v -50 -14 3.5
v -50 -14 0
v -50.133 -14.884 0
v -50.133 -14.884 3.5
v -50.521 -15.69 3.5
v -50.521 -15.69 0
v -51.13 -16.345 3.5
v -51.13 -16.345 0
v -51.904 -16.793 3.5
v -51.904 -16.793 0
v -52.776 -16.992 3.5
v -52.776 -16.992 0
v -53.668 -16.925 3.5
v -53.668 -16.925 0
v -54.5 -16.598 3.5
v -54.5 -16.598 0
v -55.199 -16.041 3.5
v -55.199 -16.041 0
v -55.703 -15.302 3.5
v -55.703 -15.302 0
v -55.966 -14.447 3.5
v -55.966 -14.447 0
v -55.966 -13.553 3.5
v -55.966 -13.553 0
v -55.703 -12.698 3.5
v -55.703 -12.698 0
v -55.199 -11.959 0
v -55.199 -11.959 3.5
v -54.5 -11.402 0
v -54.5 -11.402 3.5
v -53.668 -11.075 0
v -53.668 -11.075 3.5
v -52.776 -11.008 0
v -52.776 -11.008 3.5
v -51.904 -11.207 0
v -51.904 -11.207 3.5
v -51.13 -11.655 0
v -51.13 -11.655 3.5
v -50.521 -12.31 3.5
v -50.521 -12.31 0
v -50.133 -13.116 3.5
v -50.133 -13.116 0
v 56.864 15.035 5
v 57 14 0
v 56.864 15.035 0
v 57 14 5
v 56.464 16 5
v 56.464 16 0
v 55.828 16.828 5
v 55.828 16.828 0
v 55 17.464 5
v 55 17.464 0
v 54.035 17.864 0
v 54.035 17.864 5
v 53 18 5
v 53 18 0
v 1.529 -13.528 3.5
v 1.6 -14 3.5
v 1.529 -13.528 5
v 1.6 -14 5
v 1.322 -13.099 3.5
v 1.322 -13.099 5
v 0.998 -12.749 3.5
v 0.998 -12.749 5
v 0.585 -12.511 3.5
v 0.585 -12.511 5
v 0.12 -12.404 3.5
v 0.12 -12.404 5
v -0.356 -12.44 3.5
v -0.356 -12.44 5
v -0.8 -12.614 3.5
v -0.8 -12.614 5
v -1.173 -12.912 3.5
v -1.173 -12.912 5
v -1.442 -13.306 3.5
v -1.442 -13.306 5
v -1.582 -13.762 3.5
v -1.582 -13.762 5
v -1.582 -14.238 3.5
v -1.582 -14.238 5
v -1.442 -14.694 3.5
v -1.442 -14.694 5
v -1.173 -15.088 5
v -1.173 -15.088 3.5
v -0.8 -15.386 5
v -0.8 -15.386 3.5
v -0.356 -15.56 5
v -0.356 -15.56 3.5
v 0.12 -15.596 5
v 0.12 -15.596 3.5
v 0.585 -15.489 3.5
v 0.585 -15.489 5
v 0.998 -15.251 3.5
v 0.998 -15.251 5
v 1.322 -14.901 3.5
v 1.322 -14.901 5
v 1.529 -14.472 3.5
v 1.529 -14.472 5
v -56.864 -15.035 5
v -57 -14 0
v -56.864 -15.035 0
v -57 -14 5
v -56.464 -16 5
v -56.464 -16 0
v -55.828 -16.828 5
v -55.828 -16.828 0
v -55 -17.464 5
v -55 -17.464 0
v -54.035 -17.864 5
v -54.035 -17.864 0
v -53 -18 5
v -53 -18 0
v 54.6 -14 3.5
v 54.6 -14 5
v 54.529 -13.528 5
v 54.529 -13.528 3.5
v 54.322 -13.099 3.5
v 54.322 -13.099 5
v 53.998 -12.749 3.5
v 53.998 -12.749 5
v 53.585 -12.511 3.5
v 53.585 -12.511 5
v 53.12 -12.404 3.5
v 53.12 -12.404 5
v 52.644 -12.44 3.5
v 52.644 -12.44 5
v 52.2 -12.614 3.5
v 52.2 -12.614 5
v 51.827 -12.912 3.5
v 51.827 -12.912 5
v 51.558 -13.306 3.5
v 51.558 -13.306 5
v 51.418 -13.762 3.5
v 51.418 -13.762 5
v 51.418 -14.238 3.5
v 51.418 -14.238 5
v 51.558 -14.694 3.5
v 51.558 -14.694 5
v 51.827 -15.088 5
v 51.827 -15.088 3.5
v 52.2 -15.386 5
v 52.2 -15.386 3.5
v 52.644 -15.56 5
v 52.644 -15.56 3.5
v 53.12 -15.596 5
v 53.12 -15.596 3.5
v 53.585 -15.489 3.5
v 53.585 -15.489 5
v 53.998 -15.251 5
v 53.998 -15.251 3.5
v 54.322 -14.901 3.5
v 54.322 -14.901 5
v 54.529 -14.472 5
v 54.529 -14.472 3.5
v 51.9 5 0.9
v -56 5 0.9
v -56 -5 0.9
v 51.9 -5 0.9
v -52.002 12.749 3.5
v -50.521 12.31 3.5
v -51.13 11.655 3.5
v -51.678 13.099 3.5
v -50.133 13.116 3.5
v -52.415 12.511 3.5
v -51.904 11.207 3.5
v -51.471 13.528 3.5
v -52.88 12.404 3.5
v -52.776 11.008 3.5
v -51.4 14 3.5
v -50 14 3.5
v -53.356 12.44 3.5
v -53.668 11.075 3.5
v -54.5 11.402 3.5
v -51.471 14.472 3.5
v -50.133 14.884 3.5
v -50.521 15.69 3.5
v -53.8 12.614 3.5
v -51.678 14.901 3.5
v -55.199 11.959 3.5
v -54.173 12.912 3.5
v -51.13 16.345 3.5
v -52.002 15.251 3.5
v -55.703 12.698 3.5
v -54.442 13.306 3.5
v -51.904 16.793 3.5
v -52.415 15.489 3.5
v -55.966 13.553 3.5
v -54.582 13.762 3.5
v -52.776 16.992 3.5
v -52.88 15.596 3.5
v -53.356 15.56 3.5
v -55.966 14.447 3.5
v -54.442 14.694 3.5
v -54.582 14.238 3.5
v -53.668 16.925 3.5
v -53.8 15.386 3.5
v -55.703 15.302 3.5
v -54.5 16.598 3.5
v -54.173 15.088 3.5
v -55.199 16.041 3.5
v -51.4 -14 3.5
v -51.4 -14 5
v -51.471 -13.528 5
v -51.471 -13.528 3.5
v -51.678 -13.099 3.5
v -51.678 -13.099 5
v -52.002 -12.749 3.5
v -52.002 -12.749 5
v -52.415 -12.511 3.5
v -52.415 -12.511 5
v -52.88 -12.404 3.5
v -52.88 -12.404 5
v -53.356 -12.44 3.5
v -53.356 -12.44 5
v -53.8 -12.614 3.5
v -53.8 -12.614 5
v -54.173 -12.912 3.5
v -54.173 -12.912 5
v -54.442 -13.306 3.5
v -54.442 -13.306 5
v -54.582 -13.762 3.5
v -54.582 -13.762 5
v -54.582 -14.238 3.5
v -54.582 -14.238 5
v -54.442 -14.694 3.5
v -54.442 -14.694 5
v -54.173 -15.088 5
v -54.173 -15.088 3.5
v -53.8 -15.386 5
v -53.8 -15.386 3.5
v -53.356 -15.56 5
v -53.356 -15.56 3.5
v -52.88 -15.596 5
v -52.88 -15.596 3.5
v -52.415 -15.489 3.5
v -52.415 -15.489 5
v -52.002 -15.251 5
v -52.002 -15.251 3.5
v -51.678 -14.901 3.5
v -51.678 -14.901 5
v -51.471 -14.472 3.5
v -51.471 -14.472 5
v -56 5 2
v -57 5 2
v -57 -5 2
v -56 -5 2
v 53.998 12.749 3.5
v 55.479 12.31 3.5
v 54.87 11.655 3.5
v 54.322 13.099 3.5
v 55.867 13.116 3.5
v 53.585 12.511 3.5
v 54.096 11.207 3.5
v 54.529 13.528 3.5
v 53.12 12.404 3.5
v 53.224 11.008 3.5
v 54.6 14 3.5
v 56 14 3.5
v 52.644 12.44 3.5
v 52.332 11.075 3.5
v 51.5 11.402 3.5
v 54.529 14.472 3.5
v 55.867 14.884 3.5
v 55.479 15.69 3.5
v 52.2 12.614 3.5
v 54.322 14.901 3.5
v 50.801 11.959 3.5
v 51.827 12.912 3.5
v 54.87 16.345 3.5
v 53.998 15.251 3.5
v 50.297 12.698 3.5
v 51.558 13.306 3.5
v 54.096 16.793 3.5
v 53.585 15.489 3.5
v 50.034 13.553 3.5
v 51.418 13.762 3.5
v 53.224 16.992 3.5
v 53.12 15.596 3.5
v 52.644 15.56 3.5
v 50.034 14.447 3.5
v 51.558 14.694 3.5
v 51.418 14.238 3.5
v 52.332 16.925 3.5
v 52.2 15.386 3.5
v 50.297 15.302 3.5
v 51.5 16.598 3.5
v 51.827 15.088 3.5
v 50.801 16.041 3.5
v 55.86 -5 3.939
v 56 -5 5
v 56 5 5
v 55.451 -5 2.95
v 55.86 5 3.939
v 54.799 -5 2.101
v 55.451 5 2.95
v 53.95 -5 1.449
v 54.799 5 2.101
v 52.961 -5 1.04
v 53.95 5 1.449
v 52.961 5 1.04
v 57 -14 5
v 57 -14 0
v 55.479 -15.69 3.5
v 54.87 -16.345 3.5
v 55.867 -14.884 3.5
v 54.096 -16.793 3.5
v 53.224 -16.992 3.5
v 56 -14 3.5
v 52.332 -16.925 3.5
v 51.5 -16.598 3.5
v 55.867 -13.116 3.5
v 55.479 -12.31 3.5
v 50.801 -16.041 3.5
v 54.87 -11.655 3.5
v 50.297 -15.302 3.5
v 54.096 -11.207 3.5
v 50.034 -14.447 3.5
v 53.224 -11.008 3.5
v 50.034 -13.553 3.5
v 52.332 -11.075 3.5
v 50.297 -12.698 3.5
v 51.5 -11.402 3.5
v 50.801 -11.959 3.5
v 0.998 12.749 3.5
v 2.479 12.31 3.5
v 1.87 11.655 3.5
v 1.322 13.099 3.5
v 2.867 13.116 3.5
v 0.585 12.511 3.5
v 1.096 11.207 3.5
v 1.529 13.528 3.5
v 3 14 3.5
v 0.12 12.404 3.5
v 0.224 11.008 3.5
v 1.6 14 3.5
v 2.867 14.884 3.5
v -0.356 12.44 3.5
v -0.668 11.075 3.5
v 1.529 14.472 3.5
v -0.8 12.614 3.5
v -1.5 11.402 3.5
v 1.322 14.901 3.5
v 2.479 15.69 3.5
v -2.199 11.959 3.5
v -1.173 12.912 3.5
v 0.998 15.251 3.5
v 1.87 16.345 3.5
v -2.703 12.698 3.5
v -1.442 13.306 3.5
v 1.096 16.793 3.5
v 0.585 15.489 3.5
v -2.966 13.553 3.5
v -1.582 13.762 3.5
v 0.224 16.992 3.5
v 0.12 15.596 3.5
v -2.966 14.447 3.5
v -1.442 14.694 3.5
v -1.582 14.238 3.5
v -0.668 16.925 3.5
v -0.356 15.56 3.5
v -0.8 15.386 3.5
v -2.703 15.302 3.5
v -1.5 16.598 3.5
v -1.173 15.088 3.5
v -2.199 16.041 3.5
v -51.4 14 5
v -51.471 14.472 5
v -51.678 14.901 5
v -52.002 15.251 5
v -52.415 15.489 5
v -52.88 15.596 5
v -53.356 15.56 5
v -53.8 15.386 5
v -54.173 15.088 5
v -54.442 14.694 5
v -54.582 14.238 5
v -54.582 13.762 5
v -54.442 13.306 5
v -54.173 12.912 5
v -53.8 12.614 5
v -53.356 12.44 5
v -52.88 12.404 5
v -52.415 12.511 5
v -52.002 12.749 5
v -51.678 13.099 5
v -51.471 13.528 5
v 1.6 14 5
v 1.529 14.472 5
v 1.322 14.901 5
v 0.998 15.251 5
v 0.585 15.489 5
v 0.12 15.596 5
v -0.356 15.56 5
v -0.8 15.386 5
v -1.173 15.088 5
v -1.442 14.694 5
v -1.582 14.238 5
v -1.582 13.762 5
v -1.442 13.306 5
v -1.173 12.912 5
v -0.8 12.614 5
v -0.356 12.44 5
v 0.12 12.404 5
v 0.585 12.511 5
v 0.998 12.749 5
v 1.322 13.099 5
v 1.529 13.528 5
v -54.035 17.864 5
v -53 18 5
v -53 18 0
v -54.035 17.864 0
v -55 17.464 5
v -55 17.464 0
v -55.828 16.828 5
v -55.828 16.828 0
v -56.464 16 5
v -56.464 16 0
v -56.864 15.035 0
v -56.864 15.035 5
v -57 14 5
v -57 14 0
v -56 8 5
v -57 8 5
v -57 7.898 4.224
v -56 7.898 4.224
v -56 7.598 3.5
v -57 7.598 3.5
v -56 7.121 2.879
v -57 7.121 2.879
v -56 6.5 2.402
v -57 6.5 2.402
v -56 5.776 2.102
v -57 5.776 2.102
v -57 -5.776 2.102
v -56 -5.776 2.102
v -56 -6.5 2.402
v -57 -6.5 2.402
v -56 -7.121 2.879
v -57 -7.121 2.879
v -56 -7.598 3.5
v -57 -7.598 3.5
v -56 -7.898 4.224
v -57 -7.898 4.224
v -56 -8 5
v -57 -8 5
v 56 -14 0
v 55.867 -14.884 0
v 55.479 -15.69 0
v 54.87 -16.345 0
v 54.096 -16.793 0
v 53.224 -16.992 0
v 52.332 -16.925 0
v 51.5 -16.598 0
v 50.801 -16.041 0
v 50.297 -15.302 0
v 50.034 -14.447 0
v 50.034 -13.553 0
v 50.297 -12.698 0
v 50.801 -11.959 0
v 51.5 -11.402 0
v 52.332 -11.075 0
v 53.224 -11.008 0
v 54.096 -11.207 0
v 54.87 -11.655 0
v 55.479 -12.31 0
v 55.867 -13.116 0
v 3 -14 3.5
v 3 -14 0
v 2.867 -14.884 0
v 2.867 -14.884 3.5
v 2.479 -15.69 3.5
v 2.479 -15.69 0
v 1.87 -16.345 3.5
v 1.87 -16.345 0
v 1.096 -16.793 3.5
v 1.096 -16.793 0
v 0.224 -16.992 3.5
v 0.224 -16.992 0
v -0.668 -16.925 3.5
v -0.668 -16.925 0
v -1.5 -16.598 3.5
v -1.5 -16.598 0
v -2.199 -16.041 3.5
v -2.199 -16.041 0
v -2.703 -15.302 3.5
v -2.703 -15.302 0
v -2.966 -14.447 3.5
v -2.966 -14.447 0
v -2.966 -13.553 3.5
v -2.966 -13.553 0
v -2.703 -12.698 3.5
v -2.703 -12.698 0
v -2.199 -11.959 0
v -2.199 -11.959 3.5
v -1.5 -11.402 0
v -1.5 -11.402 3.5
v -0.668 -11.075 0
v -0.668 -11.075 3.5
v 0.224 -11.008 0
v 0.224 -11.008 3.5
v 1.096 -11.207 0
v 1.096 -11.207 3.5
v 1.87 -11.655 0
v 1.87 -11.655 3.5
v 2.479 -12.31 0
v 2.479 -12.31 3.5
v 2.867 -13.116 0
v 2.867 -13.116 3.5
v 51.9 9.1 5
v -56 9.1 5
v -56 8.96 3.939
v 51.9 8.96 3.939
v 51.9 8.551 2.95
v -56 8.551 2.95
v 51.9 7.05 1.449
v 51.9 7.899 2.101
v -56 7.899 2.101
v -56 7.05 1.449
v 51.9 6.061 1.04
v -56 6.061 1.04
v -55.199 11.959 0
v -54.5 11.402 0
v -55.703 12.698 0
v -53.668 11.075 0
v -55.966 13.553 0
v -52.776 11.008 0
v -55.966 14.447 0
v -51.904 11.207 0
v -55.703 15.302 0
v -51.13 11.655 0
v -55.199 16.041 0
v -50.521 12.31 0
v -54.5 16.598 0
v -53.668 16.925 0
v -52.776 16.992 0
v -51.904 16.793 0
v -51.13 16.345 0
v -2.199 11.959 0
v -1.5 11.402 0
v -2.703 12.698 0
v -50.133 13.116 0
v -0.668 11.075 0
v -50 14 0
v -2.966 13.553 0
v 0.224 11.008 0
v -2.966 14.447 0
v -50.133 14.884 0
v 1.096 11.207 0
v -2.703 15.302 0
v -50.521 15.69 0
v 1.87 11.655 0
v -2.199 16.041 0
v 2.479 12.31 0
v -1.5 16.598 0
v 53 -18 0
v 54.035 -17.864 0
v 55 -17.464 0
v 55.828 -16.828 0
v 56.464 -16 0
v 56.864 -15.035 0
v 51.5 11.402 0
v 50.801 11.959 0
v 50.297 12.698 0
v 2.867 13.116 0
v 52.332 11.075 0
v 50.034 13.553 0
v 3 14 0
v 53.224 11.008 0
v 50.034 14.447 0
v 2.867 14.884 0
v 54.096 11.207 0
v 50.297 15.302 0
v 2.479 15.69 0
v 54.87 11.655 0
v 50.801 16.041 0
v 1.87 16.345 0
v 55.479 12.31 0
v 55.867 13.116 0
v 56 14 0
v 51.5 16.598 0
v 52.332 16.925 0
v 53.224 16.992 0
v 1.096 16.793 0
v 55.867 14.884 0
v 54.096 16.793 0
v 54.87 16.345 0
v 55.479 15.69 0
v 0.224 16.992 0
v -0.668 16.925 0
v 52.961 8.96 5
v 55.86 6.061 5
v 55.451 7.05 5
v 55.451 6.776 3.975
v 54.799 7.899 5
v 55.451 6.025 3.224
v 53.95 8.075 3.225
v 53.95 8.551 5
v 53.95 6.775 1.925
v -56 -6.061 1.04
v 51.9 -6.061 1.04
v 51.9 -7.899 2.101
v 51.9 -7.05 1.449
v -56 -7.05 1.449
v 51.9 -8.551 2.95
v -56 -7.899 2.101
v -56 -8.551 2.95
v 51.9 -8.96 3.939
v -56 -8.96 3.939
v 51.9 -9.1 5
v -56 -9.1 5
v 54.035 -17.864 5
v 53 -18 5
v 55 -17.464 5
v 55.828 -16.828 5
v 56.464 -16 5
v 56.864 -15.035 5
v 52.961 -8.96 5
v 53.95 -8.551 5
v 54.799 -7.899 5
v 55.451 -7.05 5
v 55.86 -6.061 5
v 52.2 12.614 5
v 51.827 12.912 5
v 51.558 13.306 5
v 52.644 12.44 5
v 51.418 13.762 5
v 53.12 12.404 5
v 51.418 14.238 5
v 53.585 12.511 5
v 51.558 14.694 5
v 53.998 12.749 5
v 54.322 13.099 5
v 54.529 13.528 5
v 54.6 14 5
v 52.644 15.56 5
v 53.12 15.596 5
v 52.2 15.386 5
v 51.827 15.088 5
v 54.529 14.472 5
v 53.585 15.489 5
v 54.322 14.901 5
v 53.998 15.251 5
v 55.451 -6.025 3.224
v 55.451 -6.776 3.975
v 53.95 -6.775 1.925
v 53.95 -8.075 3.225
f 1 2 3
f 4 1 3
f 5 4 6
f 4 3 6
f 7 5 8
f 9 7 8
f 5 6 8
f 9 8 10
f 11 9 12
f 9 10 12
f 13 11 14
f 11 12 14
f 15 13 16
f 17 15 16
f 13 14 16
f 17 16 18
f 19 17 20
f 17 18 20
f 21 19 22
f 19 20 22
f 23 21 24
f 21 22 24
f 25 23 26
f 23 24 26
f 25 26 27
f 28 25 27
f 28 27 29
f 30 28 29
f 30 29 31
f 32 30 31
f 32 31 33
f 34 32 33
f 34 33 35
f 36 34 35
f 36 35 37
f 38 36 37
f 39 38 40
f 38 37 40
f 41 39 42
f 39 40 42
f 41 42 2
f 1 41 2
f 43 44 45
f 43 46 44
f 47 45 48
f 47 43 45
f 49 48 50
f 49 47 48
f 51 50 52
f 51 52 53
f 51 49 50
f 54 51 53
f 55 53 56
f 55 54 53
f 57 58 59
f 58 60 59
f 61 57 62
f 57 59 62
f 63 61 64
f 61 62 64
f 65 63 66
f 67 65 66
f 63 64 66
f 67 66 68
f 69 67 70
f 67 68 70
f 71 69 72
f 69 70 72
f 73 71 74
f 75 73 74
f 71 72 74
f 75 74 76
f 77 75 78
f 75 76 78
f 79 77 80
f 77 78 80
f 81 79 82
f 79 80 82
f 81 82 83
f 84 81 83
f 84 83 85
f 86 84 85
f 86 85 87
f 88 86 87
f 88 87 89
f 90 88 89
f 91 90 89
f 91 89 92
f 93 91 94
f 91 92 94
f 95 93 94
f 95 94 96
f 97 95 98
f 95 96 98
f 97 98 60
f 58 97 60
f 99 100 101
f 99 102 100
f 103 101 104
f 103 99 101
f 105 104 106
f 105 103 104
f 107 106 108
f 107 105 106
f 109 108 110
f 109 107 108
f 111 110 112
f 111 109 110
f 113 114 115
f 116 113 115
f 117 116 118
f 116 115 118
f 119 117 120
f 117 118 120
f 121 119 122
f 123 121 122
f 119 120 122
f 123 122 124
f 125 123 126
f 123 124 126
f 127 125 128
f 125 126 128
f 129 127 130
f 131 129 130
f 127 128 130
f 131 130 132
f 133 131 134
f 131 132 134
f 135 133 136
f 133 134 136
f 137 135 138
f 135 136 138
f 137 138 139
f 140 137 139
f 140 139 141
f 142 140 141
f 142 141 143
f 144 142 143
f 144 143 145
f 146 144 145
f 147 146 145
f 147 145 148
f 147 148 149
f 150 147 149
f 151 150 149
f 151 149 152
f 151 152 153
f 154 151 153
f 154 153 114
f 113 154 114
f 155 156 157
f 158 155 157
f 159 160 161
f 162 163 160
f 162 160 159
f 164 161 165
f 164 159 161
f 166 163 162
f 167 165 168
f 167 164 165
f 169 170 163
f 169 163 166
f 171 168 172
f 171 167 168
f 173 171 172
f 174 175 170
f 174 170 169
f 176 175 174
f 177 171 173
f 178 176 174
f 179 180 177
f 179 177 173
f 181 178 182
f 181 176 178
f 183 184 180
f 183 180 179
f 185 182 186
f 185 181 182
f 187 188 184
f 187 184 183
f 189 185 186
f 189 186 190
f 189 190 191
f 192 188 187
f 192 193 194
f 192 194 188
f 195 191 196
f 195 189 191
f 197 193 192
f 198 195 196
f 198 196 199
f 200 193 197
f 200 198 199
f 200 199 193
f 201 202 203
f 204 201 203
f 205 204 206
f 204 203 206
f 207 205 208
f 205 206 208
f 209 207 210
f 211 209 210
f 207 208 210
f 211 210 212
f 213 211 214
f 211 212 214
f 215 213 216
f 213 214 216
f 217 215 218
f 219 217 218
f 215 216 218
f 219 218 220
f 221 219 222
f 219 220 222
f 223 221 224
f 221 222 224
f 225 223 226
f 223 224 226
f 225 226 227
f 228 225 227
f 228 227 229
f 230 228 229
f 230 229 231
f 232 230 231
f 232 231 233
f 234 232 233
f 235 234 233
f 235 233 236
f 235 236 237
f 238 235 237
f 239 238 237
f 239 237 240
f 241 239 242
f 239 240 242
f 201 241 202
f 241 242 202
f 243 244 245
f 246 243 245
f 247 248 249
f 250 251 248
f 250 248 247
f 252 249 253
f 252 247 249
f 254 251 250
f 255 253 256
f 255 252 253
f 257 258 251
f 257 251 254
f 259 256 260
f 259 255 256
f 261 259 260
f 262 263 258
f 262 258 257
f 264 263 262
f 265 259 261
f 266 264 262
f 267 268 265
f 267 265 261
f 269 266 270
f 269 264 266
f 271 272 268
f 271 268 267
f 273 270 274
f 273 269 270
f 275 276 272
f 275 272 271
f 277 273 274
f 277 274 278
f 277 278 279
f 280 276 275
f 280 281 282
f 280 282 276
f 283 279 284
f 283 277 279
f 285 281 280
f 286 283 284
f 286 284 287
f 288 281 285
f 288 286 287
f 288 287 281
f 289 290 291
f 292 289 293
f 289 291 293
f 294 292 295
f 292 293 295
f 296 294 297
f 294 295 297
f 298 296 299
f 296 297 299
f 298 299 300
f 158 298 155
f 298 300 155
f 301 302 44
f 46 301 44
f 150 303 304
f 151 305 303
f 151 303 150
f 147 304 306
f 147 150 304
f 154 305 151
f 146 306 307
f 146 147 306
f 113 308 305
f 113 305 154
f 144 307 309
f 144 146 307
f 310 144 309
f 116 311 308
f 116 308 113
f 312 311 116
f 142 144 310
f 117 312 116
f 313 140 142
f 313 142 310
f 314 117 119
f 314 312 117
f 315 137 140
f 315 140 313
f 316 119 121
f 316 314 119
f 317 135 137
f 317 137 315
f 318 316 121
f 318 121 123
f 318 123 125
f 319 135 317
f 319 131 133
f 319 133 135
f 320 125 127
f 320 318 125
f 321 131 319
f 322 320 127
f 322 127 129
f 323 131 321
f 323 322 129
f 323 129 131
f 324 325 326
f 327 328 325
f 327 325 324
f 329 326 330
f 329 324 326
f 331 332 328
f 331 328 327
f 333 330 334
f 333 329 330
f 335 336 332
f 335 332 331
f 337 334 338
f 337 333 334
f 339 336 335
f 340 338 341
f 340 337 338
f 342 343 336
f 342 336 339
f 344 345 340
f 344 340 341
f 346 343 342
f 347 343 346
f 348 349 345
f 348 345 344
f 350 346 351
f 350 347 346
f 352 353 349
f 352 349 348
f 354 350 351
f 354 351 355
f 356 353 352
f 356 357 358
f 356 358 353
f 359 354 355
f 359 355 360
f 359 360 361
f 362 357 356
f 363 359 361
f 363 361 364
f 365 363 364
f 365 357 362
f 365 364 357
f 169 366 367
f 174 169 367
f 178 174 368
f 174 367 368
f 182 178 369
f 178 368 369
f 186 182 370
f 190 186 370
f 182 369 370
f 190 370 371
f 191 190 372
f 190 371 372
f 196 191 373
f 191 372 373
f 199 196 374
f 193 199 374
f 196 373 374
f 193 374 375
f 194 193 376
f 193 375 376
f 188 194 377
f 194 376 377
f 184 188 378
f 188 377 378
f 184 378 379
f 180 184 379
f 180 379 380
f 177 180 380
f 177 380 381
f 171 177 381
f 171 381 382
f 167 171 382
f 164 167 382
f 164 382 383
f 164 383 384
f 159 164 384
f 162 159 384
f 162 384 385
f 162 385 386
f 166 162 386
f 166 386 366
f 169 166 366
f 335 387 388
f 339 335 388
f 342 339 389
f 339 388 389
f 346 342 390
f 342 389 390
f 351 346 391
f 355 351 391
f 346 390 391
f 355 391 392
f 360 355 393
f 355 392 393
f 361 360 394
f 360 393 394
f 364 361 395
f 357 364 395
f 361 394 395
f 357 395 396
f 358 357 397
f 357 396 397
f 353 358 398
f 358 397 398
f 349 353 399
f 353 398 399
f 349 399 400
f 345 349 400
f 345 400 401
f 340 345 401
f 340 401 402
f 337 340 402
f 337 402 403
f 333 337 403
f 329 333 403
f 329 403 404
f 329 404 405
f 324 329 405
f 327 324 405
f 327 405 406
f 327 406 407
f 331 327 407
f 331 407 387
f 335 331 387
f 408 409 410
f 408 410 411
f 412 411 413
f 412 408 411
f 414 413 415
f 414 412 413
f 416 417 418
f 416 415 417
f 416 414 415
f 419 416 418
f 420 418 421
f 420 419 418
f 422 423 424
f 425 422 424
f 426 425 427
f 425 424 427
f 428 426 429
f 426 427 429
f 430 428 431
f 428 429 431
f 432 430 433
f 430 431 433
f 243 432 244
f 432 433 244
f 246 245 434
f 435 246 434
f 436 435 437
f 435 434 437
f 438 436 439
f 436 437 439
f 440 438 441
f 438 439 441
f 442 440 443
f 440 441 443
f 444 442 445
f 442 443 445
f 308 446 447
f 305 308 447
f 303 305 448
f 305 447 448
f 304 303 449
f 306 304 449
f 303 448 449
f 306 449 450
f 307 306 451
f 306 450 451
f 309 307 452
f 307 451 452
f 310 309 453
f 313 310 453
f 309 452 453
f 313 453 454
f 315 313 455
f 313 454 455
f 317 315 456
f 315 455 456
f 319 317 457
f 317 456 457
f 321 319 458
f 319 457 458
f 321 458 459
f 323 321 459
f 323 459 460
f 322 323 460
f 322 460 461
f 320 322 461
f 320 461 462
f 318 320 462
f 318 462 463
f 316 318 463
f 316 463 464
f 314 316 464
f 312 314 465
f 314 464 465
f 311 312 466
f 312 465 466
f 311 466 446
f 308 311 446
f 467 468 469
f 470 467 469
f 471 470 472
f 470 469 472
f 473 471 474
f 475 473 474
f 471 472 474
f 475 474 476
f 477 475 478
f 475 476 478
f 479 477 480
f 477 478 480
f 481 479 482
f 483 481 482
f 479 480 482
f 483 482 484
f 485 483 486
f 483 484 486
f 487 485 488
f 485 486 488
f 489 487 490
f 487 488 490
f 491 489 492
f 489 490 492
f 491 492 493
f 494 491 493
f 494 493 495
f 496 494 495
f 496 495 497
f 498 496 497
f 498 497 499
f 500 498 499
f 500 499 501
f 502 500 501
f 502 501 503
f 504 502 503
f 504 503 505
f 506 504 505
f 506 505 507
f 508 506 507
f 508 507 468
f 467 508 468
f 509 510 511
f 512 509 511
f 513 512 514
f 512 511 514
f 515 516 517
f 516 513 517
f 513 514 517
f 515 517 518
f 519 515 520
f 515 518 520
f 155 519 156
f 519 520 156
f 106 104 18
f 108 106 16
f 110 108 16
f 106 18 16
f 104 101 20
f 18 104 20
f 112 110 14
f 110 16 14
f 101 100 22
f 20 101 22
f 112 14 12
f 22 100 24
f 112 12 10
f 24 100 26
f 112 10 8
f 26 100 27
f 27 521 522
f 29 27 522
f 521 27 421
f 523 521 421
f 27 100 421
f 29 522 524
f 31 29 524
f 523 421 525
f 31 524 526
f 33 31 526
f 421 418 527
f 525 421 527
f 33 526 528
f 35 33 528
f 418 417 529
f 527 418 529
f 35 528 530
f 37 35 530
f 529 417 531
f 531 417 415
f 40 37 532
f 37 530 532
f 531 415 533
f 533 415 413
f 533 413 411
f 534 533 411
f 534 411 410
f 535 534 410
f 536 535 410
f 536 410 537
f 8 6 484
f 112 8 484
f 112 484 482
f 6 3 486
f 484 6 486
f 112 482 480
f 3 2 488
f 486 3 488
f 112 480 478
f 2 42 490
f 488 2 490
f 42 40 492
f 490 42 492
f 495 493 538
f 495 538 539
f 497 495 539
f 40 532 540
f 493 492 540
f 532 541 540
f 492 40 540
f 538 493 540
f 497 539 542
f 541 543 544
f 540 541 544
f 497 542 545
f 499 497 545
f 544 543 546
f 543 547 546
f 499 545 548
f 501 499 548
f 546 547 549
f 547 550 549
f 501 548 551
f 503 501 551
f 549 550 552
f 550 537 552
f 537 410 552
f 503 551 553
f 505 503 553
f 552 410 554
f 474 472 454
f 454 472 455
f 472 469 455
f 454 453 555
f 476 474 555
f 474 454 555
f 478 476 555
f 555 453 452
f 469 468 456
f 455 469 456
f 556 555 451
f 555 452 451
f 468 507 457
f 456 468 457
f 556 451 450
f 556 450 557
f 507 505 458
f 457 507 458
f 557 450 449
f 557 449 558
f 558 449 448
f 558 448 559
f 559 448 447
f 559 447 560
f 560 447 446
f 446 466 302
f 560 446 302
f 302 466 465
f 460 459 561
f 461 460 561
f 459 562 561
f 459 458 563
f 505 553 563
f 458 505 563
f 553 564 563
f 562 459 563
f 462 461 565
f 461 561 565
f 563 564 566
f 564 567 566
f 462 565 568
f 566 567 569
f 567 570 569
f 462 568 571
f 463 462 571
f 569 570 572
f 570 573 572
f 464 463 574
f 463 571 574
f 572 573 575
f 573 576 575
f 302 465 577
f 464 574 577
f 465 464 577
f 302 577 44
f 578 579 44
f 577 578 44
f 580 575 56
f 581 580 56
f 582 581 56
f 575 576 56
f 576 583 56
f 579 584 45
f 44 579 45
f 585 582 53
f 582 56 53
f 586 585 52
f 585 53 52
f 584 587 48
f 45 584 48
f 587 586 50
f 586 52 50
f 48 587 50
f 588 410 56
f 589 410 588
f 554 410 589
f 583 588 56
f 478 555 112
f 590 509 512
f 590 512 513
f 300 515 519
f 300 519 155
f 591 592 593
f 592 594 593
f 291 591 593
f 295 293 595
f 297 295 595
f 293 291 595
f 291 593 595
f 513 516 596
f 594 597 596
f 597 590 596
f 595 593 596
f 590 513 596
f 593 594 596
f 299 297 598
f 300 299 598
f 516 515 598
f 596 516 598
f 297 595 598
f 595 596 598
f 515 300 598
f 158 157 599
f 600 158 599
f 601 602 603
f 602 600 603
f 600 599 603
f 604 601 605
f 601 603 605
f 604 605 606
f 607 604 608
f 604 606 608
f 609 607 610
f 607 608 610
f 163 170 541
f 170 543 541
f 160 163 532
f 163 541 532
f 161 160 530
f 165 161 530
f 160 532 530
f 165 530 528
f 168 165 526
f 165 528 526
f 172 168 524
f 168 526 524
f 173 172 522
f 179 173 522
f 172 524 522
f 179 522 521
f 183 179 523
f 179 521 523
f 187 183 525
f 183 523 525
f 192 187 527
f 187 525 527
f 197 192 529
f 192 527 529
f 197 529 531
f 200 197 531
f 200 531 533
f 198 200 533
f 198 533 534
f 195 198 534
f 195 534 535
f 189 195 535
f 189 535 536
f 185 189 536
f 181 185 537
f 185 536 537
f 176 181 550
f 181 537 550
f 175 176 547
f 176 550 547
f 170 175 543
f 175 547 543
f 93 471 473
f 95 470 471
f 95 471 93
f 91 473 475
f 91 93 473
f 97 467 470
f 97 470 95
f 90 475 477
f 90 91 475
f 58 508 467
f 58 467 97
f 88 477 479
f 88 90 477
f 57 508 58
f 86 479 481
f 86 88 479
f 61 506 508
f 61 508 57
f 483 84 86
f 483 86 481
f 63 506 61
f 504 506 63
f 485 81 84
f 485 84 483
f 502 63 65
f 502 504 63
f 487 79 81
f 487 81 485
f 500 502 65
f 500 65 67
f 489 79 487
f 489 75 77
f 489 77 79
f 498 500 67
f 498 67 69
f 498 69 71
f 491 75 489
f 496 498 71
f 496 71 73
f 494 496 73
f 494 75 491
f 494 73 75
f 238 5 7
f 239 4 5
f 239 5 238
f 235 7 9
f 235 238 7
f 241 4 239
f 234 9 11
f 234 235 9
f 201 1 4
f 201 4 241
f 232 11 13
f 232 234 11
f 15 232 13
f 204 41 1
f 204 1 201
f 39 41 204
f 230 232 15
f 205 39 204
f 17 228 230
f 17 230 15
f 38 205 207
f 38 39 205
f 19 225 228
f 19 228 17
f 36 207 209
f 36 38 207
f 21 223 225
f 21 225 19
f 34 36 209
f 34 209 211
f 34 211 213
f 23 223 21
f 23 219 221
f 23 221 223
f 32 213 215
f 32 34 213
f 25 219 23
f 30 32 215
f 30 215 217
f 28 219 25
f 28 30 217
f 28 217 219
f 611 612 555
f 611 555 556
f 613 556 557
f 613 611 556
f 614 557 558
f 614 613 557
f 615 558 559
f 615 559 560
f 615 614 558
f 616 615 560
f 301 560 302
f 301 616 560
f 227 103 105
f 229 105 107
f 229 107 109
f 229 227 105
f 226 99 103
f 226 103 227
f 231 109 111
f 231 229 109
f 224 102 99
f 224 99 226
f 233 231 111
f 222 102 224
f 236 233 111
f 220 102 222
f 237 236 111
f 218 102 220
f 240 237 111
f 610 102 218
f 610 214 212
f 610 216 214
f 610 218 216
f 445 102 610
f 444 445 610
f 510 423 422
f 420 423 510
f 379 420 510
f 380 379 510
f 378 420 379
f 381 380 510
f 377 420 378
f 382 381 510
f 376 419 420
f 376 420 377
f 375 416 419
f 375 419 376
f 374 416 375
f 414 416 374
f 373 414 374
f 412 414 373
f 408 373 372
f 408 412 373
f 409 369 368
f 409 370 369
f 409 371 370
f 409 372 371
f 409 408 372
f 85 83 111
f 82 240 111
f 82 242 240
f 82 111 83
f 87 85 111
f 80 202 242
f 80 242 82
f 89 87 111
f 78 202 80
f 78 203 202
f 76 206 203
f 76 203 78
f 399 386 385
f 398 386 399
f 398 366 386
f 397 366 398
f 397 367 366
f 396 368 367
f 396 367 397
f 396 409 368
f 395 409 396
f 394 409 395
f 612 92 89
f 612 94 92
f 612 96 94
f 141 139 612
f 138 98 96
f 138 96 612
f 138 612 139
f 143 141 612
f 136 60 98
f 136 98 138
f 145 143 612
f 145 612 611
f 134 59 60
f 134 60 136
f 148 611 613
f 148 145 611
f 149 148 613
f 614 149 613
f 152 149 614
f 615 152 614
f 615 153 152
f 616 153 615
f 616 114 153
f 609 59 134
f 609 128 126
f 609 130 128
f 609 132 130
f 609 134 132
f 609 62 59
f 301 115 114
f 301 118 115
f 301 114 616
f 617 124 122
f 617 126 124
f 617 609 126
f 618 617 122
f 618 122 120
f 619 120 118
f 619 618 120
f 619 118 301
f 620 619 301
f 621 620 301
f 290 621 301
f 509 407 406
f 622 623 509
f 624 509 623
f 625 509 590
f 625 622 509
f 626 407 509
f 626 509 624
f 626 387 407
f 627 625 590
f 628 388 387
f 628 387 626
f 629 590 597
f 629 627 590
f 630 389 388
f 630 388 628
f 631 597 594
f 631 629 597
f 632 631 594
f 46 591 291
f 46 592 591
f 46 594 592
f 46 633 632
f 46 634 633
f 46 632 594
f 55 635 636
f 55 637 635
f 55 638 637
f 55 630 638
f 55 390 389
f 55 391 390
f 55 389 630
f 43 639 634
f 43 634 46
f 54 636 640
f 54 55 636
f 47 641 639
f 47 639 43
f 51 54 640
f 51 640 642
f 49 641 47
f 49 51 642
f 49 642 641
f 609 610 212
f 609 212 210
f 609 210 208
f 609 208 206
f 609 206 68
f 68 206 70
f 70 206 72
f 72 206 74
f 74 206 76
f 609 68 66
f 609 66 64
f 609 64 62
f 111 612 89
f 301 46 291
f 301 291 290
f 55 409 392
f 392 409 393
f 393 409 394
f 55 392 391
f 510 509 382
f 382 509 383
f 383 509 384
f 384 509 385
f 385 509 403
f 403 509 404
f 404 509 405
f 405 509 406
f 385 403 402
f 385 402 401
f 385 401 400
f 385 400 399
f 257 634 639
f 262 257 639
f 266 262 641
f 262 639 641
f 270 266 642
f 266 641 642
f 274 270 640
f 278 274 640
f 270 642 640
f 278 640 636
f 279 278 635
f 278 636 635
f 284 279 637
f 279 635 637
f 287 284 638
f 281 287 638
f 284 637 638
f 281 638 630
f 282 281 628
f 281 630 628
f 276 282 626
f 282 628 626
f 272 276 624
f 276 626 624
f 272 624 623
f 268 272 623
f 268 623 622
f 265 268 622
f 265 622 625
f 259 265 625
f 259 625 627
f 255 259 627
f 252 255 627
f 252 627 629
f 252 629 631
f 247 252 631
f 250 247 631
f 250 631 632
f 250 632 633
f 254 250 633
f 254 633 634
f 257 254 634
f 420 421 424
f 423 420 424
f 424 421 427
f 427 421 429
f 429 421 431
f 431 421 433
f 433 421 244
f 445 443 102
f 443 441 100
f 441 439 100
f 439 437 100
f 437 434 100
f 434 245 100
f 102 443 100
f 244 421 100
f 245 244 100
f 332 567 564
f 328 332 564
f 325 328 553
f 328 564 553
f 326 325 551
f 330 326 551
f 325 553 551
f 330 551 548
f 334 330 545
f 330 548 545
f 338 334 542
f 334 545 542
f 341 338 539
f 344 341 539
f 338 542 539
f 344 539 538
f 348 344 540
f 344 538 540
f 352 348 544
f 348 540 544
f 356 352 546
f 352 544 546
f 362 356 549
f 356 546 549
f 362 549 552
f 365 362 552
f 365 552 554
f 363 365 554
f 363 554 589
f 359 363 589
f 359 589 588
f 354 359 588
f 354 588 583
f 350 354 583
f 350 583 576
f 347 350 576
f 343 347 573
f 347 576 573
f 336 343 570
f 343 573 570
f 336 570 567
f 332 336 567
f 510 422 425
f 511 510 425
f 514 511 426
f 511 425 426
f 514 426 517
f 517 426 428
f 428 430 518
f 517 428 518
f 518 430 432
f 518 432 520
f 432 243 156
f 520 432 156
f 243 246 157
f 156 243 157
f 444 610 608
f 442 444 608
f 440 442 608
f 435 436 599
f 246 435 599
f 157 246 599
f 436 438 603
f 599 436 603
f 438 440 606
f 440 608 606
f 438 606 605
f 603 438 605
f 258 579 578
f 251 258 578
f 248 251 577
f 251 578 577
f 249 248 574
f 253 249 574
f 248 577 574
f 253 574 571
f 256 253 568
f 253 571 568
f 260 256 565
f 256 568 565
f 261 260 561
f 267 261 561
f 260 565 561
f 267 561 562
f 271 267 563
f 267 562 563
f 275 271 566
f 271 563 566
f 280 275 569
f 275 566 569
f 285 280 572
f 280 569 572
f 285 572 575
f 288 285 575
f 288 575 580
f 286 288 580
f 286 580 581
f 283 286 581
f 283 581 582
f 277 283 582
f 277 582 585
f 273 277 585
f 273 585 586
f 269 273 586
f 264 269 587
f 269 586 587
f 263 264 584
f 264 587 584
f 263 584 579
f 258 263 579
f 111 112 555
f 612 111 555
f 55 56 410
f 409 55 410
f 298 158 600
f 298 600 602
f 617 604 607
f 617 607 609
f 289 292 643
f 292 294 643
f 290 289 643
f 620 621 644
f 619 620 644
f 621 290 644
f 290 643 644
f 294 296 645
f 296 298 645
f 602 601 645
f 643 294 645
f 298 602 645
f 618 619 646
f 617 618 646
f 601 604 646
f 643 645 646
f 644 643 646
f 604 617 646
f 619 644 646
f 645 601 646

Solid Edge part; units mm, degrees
sketch "Sketch1" plane through (0, 0, 0) normal (0, 0, 1) x (1, 0, 0)
  line L0 (57, -18) -> (57, 18)
  line L1 (57, 18) -> (-57, 18)
  line L2 (-57, 18) -> (-57, -18)
  line L3 (-57, -18) -> (57, -18)
extrude "Protrusion1" add sketch "Sketch1" along normal blind 5
sketch "Sketch2" plane through (-57, 0, 2.5) normal (-1, 0, 0) x (0, -1, 0)
  line L0 (-5, -0.5) -> (5, -0.5)
  line L1 (-8, 2.5) -> (8, 2.5)
  arc A0 (8, 2.5) -> (5, -0.5) centre (5, 2.5) cw
  arc A1 (-5, -0.5) -> (-8, 2.5) centre (-5, 2.5) cw
extrude "VaciadoExtruido_2" cut sketch "Sketch2" against normal blind 1
sketch "Sketch3" plane through (-56, 0, 2.5) normal (-1, 0, 0) x (0, -1, 0)
  line L0 (-5, -1.6) -> (5, -1.6)
  line L1 (-9.1, 2.5) -> (9.1, 2.5)
  arc A0 (9.1, 2.5) -> (5, -1.6) centre (5, 2.5) cw
  arc A1 (-5, -1.6) -> (-9.1, 2.5) centre (-5, 2.5) cw
extrude "VaciadoExtruido_3" cut sketch "Sketch3" against normal blind 112
fillet "Redondeo_3" radius 4.1 3 edges at (56, 7.8991, 2.1009) (56, -7.8991, 2.1009) (56, 0, 0.9)
sketch "Sketch4" plane through (0, 0, 5) normal (0, 0, 1) x (1, 0, 0)
  circle A0 centre (-53, 14) radius 1.6
extrude "Cutout1" cut sketch "Sketch4" against normal through all
sketch "Sketch5" plane through (0, 0, 0) normal (0, 0, -1) x (1, 0, 0)
  circle A0 centre (-53, -14) radius 3
extrude "VaciadoExtruido_5" cut sketch "Sketch5" against normal blind 3.5
pattern_linear "Pattern1" count 3 spacing 53 along (1, 0, 0) count 2 spacing 28 along (0, -1, 0) of "VaciadoExtruido_5", "Cutout1"
fillet "Redondeo_4" radius 4 4 edges at (-57, 18, 2.5) (-57, -18, 2.5) (57, 18, 2.5) (57, -18, 2.5)
